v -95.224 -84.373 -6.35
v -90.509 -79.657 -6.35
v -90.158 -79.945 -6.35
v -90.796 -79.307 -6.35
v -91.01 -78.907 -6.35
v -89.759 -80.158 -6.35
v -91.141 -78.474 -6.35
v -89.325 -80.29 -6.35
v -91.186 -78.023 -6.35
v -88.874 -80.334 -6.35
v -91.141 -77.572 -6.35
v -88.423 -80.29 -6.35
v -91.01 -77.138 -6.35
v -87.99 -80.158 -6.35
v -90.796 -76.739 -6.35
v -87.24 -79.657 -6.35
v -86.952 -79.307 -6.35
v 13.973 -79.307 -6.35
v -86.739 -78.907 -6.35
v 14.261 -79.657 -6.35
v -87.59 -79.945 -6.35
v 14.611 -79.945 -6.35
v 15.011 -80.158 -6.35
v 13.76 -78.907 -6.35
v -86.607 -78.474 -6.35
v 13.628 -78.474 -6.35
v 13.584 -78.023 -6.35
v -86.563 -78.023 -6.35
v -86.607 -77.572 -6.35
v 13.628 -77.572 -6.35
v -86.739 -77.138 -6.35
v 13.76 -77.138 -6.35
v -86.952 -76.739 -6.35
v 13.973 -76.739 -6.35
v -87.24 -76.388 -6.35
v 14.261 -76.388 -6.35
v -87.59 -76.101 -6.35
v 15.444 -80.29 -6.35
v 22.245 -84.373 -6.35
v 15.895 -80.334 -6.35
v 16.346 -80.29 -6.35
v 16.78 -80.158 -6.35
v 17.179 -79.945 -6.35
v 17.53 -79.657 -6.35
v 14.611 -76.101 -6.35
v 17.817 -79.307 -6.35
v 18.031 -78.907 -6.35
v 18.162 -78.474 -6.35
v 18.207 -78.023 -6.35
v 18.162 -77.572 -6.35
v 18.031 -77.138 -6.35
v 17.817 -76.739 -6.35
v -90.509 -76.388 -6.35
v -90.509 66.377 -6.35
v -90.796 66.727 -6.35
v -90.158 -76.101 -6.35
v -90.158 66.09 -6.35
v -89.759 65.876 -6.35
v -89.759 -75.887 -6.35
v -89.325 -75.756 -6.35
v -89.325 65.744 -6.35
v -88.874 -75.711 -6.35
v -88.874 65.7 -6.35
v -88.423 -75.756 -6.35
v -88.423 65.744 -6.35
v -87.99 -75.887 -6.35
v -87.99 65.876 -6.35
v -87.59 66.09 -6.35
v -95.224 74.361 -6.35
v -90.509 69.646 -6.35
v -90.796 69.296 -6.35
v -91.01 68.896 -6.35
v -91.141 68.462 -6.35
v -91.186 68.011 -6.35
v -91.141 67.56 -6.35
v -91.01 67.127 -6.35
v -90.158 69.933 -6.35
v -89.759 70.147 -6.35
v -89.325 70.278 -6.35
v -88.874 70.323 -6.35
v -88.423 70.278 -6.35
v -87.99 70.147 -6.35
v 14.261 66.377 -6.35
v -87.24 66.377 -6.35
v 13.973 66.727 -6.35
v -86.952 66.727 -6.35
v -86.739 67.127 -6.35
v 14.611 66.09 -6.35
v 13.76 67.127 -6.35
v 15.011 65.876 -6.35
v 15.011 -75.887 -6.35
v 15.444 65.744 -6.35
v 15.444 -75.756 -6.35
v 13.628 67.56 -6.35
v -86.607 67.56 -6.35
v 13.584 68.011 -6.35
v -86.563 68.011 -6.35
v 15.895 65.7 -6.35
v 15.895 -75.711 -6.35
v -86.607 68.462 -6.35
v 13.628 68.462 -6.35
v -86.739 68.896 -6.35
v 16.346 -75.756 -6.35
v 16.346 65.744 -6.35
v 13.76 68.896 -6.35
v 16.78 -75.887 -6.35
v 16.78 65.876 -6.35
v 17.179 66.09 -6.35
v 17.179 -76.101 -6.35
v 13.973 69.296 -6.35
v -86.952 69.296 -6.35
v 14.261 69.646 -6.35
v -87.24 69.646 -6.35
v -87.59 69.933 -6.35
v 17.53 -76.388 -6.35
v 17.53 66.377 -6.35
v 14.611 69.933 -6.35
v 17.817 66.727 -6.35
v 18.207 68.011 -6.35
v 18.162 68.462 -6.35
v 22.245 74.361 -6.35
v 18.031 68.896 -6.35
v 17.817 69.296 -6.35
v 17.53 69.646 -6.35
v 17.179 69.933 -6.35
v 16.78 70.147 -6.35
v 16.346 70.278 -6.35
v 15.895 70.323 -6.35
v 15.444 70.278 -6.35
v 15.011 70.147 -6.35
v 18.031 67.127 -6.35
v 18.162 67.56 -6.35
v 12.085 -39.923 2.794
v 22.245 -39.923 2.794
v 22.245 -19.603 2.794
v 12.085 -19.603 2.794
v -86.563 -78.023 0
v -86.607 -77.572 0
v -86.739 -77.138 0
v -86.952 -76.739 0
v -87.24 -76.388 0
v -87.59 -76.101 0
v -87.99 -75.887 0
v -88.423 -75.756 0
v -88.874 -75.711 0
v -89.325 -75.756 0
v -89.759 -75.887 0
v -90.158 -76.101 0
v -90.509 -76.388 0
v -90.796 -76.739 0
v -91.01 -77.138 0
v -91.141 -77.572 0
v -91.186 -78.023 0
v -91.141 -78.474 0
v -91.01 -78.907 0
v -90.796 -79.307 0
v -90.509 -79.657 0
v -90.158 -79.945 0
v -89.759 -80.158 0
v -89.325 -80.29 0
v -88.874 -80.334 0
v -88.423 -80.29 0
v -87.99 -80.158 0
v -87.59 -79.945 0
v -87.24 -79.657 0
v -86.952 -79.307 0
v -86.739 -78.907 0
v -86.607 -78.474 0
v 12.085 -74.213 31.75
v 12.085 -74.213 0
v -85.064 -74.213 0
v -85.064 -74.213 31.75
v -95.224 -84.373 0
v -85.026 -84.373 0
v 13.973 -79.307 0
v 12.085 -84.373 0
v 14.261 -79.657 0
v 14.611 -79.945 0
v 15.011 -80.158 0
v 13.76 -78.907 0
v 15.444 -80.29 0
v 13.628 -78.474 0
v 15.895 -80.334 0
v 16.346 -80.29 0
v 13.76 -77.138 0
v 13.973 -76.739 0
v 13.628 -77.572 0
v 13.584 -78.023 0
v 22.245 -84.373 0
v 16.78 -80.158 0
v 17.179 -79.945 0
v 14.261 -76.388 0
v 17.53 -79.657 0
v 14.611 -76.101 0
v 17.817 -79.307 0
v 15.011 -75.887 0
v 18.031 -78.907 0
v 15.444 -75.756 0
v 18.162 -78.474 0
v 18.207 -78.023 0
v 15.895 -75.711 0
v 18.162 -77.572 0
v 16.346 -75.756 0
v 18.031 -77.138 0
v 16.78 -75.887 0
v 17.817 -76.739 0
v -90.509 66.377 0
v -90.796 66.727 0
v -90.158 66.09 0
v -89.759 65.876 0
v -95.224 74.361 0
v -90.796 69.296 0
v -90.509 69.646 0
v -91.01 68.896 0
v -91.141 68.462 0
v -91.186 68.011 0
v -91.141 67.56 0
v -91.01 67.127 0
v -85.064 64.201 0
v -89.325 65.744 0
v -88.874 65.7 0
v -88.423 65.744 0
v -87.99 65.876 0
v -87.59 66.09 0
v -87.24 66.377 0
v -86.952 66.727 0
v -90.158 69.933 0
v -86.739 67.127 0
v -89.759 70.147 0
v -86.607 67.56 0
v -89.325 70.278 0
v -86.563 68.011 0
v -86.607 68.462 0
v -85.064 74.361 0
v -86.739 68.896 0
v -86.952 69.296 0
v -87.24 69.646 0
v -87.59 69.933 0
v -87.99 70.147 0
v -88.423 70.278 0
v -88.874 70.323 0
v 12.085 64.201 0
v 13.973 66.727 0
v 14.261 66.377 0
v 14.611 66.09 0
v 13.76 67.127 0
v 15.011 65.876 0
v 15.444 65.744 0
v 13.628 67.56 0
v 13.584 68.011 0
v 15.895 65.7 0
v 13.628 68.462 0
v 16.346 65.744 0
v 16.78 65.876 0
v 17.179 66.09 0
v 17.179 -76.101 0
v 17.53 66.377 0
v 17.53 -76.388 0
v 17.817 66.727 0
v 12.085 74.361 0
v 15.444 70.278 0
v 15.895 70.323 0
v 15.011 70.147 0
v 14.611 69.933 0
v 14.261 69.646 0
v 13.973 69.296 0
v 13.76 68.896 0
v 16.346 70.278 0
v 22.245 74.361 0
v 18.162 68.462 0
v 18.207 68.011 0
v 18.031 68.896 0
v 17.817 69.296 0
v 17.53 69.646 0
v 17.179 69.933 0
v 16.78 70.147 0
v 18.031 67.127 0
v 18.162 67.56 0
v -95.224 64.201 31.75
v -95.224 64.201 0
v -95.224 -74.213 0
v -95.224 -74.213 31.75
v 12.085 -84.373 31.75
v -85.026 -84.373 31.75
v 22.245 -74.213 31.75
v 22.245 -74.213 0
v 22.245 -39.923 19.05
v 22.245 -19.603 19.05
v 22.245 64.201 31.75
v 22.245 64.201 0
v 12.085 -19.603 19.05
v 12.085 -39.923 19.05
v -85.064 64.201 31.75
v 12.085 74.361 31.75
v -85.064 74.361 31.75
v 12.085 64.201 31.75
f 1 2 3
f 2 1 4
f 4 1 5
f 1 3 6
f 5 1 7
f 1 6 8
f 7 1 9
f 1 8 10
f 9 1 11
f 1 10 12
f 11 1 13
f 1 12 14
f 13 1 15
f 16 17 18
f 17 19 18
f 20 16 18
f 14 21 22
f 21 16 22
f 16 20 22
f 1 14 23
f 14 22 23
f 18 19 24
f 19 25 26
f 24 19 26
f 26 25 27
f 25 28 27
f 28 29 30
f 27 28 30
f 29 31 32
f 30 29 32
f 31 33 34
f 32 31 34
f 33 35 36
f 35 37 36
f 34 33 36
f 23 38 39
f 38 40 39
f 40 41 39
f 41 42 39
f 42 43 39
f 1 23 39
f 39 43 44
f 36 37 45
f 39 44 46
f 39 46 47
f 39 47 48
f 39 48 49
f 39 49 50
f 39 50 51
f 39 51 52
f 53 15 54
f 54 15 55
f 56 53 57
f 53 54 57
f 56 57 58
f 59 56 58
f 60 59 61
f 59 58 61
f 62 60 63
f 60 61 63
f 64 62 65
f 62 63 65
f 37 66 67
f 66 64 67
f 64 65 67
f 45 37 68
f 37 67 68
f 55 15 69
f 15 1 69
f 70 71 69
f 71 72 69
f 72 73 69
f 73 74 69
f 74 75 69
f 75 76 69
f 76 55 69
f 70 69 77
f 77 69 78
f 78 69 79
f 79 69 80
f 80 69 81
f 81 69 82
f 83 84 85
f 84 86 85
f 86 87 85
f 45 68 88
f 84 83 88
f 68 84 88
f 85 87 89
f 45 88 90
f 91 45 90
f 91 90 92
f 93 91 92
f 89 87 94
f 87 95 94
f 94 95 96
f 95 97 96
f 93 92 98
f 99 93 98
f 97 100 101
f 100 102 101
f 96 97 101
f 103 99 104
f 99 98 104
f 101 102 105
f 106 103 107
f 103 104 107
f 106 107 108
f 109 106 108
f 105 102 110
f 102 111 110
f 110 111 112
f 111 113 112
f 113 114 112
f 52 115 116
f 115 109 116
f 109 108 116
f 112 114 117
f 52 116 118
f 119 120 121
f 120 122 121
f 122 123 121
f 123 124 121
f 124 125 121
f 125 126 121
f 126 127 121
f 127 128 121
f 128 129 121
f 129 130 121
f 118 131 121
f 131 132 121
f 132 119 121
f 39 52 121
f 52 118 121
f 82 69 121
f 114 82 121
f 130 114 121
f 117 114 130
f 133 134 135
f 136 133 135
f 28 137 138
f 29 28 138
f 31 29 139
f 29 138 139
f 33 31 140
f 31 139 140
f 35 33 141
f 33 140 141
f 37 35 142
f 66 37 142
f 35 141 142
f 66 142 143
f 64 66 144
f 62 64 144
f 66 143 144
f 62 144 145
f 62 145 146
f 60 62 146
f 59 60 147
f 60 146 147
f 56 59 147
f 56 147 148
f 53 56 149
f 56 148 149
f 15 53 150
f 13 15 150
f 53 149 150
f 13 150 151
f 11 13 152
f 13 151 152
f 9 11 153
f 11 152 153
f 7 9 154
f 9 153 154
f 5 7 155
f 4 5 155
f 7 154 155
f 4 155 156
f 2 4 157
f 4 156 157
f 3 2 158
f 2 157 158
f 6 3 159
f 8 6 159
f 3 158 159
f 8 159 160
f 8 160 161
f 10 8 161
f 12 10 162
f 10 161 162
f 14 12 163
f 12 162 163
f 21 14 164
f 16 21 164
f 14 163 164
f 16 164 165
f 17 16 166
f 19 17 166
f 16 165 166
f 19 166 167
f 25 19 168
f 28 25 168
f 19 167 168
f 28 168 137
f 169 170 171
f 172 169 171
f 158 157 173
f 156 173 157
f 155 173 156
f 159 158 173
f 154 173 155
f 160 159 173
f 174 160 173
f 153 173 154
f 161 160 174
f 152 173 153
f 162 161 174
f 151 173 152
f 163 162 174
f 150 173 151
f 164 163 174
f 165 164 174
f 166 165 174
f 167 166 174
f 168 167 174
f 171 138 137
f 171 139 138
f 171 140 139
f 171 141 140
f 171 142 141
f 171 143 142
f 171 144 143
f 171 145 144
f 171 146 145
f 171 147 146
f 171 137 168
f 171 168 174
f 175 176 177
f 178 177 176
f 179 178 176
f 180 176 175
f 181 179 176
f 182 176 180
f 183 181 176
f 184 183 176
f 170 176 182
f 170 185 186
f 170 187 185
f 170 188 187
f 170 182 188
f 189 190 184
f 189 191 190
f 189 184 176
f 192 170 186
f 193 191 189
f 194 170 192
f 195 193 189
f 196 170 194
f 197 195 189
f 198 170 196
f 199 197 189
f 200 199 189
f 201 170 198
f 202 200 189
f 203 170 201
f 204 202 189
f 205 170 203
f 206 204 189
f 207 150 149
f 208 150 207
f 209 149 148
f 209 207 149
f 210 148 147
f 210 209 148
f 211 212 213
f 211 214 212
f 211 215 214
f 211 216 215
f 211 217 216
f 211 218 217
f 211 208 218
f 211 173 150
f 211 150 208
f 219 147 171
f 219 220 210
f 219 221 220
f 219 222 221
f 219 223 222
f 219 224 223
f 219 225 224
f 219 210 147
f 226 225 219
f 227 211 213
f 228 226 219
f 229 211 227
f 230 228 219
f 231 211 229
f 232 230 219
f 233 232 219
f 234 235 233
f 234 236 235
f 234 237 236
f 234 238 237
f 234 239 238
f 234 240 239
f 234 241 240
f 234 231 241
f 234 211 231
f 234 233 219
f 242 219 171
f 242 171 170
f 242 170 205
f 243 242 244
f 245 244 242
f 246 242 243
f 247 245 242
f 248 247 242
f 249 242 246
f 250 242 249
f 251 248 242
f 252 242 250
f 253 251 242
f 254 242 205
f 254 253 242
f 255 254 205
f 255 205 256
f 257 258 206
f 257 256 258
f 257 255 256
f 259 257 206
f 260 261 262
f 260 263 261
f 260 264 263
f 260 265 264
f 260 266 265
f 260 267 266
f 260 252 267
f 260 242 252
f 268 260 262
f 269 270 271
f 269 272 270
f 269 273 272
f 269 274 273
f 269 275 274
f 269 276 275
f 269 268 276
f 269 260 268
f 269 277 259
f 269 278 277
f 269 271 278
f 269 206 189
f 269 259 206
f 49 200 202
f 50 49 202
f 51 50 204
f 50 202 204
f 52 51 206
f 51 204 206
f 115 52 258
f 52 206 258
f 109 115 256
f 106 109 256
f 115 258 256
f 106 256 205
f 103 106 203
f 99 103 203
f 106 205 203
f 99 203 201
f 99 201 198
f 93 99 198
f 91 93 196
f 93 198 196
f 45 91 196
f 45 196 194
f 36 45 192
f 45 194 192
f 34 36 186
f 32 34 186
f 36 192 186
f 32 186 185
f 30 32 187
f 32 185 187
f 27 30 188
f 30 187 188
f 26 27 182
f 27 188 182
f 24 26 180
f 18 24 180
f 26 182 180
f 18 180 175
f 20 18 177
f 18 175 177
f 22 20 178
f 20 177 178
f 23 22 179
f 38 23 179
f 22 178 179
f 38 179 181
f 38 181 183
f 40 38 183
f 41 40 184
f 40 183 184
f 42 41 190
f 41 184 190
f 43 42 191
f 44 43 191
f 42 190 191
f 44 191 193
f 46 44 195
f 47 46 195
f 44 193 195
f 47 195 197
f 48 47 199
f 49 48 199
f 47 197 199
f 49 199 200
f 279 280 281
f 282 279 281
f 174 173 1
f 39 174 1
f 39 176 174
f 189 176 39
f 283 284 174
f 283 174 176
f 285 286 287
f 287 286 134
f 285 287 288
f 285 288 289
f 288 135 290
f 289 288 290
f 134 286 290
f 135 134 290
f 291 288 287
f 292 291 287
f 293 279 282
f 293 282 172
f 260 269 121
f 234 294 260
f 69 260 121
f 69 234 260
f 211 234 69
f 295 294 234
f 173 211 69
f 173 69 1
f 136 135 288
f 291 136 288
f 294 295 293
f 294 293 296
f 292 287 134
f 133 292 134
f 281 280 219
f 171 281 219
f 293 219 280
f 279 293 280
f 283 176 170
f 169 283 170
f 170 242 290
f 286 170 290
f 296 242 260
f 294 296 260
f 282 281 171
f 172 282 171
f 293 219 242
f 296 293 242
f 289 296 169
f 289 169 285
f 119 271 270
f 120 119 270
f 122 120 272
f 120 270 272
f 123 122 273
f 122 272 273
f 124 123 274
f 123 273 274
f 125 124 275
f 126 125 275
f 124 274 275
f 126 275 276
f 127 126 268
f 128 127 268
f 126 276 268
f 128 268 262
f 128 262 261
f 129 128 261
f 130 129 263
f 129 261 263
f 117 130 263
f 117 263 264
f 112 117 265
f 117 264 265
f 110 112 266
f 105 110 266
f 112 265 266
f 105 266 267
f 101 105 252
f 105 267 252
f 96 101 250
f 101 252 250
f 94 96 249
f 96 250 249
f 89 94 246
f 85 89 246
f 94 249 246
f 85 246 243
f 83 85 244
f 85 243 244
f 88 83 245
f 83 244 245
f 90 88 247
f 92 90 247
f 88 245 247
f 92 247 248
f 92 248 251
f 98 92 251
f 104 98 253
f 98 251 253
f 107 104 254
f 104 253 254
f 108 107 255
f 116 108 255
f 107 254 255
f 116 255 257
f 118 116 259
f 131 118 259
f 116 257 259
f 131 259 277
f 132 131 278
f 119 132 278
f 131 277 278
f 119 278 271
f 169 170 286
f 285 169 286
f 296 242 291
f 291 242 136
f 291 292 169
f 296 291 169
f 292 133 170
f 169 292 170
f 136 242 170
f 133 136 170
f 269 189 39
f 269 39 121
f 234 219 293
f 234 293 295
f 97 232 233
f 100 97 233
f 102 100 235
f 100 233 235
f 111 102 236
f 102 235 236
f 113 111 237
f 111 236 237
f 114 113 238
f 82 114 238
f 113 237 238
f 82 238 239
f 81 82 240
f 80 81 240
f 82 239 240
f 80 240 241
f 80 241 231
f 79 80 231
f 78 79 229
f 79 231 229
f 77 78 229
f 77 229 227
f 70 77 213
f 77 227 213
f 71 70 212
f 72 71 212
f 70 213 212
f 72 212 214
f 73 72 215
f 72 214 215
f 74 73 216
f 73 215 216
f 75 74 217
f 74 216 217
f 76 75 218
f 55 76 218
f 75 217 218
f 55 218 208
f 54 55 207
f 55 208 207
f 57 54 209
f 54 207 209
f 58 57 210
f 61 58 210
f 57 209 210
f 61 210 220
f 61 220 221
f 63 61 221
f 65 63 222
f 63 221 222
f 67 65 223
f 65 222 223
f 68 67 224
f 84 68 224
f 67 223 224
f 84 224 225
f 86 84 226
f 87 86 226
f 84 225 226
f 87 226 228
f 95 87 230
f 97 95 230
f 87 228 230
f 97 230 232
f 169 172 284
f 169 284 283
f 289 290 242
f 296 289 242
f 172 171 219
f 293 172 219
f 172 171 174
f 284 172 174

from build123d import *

# Parameters (mm, degrees)
F0_R     = 2.3114
F0_W     = 97.1493866
F0_H     = 10.16
F1_DEPTH = 6.35
F2_DEPTH = 31.75
F3_DEPTH = 31.75
F4_DEPTH = 31.75
F5_DEPTH = 31.75
F7_DEPTH = 10.16


# Not quite as in the source:
# - a feature names something its author has since deleted; it is built from what else it names


with BuildPart() as f1:
    # F0 (on Top) → F1 (new body)
    with BuildSketch(Plane.XY):
        Polygon((12.0852296243, 64.2014063512), (-85.0641569757, 64.2014063512), (-85.0641569757, 61.6614063512), (-85.0641569757, 48.9614063512), (-85.0641569757, -61.5127440488), (-85.0641569757, -74.2127440488), (-72.3641569757, -74.2127440488), (-0.6147703757, -74.2127440488), (12.0852296243, -74.2127440488), (12.0852296243, -61.5127440488), (12.0852296243, 48.9614063512), (12.0852296243, 61.6614063512), align=None)
        Polygon((22.2452296243, -78.0227440488), (22.2452296243, -74.2127440488), (12.0852296243, -74.2127440488), (12.0852296243, -84.3727440488), (15.8952296243, -84.3727440488), (22.2452296243, -84.3727440488), align=None)
        with Locations((15.8952296243, -78.0227440488)):
            Circle(F0_R, mode=Mode.SUBTRACT)
        Polygon((-88.8741569757, 74.3614063512), (-95.2241569757, 74.3614063512), (-95.2241569757, 68.0114063512), (-95.2241569757, 64.2014063512), (-85.0641569757, 64.2014063512), (-85.0641569757, 74.3614063512), align=None)
        with Locations((-88.8741569757, 68.0114063512)):
            Circle(F0_R, mode=Mode.SUBTRACT)
        Polygon((-85.0641569757, -74.2127440488), (-95.2241569757, -74.2127440488), (-95.2241569757, -78.0227440488), (-95.2241569757, -84.3727440488), (-88.8741569757, -84.3727440488), (-85.0641569757, -84.3727440488), (-85.026336457, -84.3727440488), align=None)
        with Locations((-88.8741569757, -78.0227440488)):
            Circle(F0_R, mode=Mode.SUBTRACT)
        Polygon((22.2452296243, 64.2014063512), (12.0852296243, 64.2014063512), (12.0852296243, 61.6614063512), (12.0852296243, 48.9614063512), (12.0852296243, -61.5127440488), (12.0852296243, -74.2127440488), (22.2452296243, -74.2127440488), align=None)
        Polygon((-72.3641569757, -74.2127440488), (-85.0641569757, -74.2127440488), (-85.026336457, -84.3727440488), (12.0852296243, -84.3727440488), (12.0852296243, -74.2127440488), (-0.6147703757, -74.2127440488), align=None)
        with Locations((-36.4894636757, 69.2814063512)):
            Rectangle(F0_W, F0_H)
        Polygon((-85.0641569757, 64.2014063512), (-95.2241569757, 64.2014063512), (-95.2241569757, 61.6614063512), (-95.2241569757, -74.2127440488), (-85.0641569757, -74.2127440488), (-85.0641569757, -61.5127440488), (-85.0641569757, 48.9614063512), (-85.0641569757, 61.6614063512), align=None)
        Polygon((15.8952296243, 74.3614063512), (12.0852296243, 74.3614063512), (12.0852296243, 64.2014063512), (22.2452296243, 64.2014063512), (22.2452296243, 68.0114063512), (22.2452296243, 74.3614063512), align=None)
        with Locations((15.8952296243, 68.0114063512)):
            Circle(F0_R, mode=Mode.SUBTRACT)
    extrude(amount=-F1_DEPTH)

    # F0 (on Top) → F2 (join)
    with BuildSketch(Plane.XY):
        with Locations((-36.4894636757, 69.2814063512)):
            Rectangle(F0_W, F0_H)
    extrude(amount=F2_DEPTH)

    # F0 (on Top) → F3 (join)
    with BuildSketch(Plane.XY):
        Polygon((-72.3641569757, -74.2127440488), (-85.0641569757, -74.2127440488), (-85.026336457, -84.3727440488), (12.0852296243, -84.3727440488), (12.0852296243, -74.2127440488), (-0.6147703757, -74.2127440488), align=None)
    extrude(amount=F3_DEPTH)


with BuildPart() as f4:
    # F0 (on Top) → F4 (new body)
    with BuildSketch(Plane.XY):
        Polygon((22.2452296243, 64.2014063512), (12.0852296243, 64.2014063512), (12.0852296243, 61.6614063512), (12.0852296243, 48.9614063512), (12.0852296243, -61.5127440488), (12.0852296243, -74.2127440488), (22.2452296243, -74.2127440488), align=None)
    extrude(amount=F4_DEPTH)

    # F6 (on face) → F7 (cut)
    with BuildSketch(Plane.YZ.offset(22.2452296243)):
        Polygon((-39.9227440488, 19.05), (-39.9227440488, 17.3254348338), (-39.9227440488, 2.794), (-19.6027440488, 2.794), (-19.6027440488, 19.05), (-31.9871492684, 19.05), align=None)
    extrude(amount=-F7_DEPTH, mode=Mode.SUBTRACT)


with BuildPart() as f5:
    # F0 (on Top) → F5 (new body)
    with BuildSketch(Plane.XY):
        Polygon((-85.0641569757, 64.2014063512), (-95.2241569757, 64.2014063512), (-95.2241569757, 61.6614063512), (-95.2241569757, -74.2127440488), (-85.0641569757, -74.2127440488), (-85.0641569757, -61.5127440488), (-85.0641569757, 48.9614063512), (-85.0641569757, 61.6614063512), align=None)
    extrude(amount=F5_DEPTH)


solid = Compound([f1.part, f4.part, f5.part])
